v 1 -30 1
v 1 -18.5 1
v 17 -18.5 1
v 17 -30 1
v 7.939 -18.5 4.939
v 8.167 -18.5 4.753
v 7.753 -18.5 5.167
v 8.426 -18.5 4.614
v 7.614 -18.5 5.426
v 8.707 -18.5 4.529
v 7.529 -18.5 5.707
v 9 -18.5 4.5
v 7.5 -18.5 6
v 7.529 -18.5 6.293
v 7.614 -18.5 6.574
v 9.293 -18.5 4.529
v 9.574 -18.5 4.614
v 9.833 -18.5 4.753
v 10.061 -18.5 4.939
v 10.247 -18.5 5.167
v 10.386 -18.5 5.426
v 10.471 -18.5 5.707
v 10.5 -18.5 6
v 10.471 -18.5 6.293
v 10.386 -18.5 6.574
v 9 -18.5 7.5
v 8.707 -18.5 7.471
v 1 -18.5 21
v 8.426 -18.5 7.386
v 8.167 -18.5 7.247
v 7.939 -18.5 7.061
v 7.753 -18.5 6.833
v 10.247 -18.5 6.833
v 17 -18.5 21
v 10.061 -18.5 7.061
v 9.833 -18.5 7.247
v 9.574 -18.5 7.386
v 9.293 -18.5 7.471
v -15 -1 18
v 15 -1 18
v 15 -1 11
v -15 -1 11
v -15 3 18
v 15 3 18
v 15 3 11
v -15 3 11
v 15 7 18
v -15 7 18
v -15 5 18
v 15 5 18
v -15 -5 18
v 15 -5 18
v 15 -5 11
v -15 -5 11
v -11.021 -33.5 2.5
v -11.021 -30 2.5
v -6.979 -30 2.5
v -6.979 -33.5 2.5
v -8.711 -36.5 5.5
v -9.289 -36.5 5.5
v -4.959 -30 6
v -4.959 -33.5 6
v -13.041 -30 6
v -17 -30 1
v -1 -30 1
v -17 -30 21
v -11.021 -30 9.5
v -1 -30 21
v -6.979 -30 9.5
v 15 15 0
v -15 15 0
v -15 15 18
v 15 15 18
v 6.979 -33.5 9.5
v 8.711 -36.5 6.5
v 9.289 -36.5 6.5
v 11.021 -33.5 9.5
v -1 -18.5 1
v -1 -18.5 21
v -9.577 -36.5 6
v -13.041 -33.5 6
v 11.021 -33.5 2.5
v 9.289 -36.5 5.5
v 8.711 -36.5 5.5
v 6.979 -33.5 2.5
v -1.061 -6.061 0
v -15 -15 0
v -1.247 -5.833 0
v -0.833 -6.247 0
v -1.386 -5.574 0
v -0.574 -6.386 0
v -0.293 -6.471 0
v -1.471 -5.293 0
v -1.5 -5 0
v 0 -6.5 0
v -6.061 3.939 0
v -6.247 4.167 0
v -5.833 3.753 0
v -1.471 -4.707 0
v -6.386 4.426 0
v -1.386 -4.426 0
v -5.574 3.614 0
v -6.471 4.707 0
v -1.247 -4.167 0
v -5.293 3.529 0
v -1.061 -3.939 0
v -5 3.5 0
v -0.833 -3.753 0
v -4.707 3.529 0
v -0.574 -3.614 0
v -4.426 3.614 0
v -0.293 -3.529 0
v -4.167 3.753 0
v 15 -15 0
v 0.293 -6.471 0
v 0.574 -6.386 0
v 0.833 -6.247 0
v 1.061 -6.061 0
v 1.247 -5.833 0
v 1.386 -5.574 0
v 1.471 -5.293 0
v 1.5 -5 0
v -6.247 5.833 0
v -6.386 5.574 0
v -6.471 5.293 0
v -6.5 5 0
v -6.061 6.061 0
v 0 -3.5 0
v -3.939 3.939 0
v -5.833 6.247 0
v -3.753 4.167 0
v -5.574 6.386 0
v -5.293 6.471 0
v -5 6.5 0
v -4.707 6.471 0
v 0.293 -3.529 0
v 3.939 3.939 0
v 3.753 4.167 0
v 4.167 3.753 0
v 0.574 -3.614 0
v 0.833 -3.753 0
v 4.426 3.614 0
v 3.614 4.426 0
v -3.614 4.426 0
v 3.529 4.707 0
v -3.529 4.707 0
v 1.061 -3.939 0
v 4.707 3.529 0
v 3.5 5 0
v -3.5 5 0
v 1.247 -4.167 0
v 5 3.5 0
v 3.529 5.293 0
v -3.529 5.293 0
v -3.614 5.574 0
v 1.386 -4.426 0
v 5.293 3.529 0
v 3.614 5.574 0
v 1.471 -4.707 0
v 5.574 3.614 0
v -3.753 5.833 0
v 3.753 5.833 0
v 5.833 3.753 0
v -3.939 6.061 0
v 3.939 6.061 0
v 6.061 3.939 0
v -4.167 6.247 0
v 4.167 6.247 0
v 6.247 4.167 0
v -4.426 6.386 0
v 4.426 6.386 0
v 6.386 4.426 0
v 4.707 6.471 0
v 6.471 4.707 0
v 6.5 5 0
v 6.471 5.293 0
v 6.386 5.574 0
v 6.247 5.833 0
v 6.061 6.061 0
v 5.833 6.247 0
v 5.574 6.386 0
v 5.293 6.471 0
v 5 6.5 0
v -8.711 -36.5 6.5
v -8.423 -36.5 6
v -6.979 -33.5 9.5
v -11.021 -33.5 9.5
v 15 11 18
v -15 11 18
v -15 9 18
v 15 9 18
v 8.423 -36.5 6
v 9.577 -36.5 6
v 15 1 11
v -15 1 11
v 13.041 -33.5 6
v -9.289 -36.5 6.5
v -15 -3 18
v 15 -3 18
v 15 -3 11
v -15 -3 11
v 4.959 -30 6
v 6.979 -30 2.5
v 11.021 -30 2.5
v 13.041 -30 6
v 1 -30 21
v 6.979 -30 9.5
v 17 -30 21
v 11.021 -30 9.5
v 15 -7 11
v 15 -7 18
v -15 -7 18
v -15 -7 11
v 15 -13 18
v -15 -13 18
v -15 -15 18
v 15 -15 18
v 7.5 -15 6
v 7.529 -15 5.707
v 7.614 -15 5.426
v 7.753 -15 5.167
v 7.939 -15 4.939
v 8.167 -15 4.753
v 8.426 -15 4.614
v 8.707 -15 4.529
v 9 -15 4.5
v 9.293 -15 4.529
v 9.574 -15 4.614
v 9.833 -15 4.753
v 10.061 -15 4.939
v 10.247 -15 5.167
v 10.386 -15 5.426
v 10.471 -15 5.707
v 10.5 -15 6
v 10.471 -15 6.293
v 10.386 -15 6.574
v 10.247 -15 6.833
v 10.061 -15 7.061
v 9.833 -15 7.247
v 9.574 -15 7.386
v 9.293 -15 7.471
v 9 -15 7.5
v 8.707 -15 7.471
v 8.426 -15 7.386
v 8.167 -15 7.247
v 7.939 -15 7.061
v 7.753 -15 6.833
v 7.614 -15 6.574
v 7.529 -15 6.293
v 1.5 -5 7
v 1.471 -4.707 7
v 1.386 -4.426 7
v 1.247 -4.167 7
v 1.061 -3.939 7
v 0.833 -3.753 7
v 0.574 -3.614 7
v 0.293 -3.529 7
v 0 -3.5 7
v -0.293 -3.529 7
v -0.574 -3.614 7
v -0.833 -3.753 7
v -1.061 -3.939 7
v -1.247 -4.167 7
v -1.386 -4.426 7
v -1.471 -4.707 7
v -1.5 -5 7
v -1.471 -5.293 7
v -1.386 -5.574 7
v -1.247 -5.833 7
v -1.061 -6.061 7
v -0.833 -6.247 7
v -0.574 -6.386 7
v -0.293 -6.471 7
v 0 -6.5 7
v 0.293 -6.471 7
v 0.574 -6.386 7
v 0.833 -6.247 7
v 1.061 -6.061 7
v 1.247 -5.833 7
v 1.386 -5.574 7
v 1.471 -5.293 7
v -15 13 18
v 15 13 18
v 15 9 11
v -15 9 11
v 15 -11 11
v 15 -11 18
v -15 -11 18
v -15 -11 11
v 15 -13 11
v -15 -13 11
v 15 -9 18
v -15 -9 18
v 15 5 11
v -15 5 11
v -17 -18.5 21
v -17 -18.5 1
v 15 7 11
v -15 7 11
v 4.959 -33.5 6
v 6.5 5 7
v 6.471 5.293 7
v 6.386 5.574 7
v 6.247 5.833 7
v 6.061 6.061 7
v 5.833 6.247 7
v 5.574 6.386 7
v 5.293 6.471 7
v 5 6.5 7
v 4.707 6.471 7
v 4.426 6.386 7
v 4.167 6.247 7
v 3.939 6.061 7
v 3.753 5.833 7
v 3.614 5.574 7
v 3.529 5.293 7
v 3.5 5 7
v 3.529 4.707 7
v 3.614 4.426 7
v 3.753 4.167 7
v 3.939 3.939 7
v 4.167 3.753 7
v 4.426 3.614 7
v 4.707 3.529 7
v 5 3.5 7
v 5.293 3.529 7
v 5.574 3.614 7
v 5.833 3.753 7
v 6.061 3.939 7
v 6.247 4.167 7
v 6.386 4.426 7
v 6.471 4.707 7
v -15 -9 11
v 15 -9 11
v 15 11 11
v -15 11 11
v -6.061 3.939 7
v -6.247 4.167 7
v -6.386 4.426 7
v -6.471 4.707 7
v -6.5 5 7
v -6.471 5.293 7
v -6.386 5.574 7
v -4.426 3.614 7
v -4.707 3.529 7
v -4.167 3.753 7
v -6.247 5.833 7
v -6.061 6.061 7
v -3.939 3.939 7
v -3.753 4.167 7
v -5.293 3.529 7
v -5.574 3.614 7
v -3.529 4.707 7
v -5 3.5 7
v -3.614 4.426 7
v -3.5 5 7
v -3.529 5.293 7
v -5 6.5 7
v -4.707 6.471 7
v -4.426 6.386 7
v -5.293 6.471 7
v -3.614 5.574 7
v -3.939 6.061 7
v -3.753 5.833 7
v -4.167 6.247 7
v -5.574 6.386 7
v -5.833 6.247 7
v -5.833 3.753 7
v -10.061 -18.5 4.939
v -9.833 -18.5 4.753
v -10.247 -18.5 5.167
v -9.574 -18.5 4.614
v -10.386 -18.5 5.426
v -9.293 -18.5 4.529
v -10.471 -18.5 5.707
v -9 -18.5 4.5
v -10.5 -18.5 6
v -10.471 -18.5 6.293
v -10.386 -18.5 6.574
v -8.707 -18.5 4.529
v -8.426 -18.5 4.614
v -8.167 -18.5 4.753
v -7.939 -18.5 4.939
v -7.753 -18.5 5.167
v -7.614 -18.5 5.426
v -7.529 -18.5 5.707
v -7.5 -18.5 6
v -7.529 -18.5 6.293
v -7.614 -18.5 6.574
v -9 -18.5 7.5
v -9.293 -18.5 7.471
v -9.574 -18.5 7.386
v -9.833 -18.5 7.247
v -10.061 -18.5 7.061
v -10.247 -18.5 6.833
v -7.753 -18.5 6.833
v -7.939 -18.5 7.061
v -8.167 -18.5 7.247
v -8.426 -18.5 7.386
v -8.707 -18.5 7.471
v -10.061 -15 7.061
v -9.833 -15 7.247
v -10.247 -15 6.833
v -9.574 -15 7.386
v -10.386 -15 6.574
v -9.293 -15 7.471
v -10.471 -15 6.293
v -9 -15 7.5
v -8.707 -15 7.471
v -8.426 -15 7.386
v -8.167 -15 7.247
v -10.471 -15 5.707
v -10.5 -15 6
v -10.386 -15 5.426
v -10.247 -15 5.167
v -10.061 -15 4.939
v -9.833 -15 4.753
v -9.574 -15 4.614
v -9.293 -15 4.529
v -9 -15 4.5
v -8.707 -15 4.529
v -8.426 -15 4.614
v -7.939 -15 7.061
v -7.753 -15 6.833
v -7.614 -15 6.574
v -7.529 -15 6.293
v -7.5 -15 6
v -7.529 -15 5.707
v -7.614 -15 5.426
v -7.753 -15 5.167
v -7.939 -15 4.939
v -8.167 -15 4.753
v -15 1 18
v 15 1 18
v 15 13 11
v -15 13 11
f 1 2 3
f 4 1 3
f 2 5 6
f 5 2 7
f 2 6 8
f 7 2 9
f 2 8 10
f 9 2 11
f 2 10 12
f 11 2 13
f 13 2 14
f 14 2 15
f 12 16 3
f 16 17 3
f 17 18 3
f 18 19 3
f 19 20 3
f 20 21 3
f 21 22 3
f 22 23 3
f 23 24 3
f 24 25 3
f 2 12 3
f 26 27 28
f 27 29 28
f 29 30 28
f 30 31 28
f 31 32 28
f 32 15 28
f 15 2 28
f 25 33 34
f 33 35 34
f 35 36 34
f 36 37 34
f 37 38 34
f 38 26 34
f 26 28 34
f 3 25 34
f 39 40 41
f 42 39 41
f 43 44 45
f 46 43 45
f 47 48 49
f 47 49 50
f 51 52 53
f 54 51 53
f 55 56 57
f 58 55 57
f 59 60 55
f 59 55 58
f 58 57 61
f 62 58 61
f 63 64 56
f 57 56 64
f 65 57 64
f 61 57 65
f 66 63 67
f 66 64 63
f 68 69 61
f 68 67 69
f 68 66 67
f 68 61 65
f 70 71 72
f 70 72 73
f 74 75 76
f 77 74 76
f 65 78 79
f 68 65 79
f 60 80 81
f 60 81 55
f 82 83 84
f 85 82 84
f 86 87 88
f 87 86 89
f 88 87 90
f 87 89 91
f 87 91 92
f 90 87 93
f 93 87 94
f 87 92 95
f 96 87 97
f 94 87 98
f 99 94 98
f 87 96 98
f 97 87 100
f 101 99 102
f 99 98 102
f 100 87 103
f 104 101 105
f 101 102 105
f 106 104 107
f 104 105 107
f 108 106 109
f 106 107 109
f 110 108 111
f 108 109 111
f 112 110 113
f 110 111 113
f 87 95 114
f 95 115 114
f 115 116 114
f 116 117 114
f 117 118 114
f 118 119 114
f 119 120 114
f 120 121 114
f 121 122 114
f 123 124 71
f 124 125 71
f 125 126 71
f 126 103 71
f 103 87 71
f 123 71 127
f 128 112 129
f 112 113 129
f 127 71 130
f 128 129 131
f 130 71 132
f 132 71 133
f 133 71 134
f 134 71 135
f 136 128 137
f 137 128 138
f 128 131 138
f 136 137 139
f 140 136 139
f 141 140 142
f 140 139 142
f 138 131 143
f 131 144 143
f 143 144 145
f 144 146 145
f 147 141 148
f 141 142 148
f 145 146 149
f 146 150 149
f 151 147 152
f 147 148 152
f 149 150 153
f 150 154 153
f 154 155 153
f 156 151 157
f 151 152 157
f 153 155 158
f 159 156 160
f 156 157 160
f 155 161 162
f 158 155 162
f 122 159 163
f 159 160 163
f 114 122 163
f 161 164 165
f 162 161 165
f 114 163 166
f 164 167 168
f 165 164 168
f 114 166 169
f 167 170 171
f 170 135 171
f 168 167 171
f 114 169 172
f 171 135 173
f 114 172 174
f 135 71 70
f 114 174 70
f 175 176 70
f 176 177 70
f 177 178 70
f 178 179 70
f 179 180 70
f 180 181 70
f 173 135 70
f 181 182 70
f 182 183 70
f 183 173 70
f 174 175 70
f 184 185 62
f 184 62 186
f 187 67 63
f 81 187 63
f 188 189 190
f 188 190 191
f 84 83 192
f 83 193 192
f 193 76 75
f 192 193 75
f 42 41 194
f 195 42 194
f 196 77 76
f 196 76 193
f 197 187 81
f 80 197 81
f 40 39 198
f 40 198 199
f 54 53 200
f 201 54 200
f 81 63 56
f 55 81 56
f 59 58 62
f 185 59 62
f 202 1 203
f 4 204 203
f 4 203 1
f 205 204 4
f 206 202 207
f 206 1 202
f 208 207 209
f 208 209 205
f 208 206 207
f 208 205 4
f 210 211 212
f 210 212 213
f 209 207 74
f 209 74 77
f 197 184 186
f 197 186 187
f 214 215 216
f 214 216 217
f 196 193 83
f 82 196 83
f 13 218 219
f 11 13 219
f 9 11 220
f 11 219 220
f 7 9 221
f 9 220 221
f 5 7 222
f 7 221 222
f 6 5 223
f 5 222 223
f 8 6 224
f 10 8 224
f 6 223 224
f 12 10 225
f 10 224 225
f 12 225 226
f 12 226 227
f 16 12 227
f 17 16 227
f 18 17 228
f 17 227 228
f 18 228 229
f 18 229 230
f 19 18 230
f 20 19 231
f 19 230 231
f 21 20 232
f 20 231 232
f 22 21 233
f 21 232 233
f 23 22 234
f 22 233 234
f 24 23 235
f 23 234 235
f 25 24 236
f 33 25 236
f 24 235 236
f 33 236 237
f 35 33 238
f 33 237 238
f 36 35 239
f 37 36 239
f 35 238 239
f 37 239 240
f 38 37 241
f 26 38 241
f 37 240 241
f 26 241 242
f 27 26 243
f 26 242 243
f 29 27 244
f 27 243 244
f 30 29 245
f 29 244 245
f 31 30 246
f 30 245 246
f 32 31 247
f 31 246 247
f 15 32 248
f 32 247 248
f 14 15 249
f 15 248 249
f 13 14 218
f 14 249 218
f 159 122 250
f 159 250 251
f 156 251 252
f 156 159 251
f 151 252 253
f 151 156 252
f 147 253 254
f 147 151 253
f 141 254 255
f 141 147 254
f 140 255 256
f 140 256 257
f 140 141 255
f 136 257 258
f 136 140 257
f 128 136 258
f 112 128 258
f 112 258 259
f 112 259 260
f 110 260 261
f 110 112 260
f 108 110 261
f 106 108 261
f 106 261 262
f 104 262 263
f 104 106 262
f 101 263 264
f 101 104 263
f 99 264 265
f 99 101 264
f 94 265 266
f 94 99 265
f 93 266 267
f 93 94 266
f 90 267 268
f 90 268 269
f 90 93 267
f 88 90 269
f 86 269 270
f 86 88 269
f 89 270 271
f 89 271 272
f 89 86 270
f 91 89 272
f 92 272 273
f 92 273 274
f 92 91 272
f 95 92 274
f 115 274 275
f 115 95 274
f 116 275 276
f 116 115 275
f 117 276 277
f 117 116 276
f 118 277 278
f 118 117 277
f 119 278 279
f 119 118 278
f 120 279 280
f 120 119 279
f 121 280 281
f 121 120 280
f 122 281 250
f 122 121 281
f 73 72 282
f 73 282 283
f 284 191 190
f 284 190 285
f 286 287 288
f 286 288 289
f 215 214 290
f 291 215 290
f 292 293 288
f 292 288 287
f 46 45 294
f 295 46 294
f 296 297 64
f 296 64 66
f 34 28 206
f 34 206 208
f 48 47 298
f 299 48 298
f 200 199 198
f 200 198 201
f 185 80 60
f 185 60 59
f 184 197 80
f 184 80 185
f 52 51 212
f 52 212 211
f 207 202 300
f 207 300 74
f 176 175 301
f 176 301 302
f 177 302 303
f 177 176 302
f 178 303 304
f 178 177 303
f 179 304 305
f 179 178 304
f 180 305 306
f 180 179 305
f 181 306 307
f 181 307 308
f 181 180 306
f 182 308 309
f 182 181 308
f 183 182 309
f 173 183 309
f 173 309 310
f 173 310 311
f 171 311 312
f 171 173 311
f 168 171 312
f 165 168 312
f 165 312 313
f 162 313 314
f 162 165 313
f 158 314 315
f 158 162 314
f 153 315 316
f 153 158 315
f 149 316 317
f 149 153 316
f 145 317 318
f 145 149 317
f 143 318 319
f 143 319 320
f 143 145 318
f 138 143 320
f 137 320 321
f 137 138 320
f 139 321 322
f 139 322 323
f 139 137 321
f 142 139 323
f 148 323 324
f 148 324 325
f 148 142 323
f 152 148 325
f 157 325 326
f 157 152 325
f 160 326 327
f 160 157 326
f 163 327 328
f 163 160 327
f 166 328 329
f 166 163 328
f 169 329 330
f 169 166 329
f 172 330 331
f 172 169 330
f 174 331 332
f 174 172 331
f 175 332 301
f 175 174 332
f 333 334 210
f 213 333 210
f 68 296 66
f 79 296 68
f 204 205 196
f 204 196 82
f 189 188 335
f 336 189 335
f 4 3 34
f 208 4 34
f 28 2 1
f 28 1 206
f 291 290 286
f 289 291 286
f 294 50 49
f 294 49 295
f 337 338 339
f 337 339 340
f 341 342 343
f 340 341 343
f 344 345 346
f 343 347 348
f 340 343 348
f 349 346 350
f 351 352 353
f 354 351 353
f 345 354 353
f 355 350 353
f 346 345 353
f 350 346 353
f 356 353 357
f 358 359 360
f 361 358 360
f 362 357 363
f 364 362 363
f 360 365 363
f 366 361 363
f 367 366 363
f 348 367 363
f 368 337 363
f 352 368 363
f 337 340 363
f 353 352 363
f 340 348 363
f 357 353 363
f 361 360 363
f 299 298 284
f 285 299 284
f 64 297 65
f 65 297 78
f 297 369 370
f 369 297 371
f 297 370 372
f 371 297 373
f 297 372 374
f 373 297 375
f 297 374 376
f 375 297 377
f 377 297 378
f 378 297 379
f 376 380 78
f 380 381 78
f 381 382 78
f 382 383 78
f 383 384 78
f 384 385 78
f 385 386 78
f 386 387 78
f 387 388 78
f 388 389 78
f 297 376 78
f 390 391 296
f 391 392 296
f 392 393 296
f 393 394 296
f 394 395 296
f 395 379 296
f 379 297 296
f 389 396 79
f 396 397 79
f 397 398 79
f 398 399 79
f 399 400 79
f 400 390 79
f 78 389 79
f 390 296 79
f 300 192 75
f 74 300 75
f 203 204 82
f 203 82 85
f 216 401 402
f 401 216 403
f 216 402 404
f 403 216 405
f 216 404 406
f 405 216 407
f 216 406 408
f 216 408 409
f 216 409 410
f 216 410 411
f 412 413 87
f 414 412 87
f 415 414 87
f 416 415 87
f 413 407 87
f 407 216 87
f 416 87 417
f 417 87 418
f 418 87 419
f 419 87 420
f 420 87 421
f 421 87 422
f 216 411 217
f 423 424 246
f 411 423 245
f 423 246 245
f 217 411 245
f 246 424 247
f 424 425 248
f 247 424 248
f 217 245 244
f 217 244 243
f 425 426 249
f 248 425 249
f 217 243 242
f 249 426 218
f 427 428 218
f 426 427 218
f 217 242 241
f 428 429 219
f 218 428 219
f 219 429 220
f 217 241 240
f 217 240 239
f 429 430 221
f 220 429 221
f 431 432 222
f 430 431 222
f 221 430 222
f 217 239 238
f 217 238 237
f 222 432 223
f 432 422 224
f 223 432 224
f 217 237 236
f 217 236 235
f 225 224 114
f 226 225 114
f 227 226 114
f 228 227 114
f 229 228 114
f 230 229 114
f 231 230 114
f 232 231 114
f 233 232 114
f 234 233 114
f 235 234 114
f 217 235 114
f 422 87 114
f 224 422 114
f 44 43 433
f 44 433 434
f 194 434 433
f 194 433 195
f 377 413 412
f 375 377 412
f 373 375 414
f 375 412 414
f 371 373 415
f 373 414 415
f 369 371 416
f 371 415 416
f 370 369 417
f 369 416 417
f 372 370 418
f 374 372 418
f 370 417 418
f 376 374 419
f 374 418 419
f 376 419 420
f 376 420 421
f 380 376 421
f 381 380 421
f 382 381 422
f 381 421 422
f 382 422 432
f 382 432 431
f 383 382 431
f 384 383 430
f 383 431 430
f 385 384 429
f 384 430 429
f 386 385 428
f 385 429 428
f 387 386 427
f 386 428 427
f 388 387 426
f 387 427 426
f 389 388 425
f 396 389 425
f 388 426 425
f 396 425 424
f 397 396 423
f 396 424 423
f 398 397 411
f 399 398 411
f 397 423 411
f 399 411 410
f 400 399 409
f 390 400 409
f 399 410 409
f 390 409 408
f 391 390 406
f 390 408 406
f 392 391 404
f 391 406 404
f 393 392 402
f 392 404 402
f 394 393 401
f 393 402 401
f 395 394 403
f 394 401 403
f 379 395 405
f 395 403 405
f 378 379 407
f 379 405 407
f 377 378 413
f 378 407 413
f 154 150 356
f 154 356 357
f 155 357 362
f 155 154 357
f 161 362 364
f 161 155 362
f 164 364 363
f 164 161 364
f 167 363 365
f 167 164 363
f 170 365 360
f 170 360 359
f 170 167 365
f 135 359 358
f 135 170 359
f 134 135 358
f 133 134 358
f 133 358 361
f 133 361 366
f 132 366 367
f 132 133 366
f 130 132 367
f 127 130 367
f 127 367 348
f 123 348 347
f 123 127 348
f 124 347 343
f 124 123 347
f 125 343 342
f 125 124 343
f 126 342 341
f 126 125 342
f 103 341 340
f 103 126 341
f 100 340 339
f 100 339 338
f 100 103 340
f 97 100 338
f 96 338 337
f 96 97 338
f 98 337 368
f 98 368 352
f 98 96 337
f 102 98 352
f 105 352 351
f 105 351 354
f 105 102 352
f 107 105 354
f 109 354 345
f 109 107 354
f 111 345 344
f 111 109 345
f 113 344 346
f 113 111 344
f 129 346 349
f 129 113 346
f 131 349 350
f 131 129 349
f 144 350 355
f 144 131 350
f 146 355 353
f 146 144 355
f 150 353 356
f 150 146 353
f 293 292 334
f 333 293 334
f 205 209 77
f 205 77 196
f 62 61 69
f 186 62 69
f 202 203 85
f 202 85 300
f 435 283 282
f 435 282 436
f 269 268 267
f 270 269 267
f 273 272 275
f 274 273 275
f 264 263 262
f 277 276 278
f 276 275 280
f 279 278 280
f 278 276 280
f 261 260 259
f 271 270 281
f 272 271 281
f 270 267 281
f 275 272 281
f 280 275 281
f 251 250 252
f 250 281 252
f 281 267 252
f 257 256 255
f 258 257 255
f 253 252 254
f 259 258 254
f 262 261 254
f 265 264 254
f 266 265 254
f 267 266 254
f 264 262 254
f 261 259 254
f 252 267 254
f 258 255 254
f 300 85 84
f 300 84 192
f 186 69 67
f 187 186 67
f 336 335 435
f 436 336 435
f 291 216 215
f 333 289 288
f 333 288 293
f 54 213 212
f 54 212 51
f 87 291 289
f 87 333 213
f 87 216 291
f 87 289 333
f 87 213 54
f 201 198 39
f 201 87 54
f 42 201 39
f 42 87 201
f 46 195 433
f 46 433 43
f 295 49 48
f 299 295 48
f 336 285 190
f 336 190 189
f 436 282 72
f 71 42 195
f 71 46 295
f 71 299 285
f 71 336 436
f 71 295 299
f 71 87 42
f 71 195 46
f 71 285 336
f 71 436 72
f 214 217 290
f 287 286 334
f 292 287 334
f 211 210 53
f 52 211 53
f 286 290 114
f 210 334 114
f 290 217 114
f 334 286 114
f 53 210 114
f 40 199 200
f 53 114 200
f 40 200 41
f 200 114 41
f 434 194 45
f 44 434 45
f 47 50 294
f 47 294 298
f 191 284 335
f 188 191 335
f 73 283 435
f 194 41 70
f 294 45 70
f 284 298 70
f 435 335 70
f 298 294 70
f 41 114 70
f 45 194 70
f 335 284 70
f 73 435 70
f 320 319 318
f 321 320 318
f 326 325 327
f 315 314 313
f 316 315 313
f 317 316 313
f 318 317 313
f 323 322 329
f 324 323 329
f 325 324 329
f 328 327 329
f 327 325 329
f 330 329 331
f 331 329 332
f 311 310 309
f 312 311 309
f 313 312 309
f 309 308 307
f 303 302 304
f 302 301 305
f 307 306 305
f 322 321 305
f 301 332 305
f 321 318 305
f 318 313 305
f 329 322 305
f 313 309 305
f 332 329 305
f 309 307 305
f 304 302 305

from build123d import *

# Parameters (mm, degrees)
SKICA1_W                 = 30
SKICA1_H                 = 30
SKICA1_R                 = 1.5
P_IDAT_VYSUNUT_M1_DEPTH  = 7
SKICA2_W                 = 30
SKICA2_H                 = 30
P_IDAT_VYSUNUT_M2_DEPTH  = 11
SKICA3_W                 = 7
SKICA3_H                 = 2
ODEBRAT_VYSUNUT_M1_DEPTH = 30
SKICA4_R                 = 1.5
P_IDAT_VYSUNUT_M3_DEPTH  = 3.5
SKICA5_W                 = 16
SKICA5_H                 = 20
P_IDAT_VYSUNUT_M4_DEPTH  = 11.5
P_IDAT_VYSUNUT_M5_DEPTH  = 6.5
ZKOSEN_1_SIZE            = 3


with BuildPart() as part:
    # Skica1 → Přidat vysunutím1 (new body)
    with BuildSketch(Plane.XY):
        Rectangle(SKICA1_W, SKICA1_H)
        with Locations((5, 5)):
            Circle(SKICA1_R, mode=Mode.SUBTRACT)
        with Locations((-5, 5)):
            Circle(SKICA1_R, mode=Mode.SUBTRACT)
        with Locations((0, -5)):
            Circle(SKICA1_R, mode=Mode.SUBTRACT)
    extrude(amount=P_IDAT_VYSUNUT_M1_DEPTH)

    # Skica2 → Přidat vysunutím2 (add)
    with BuildSketch(Plane.XY.offset(7)):
        Rectangle(SKICA2_W, SKICA2_H)
    extrude(amount=P_IDAT_VYSUNUT_M2_DEPTH)

    # Skica3 → Odebrat vysunutím1 (cut)
    with BuildSketch(Plane(origin=(15, 0, 0), x_dir=(0, 0, -1), z_dir=(1, 0, 0))):
        with Locations((-14.5, 12)):
            Rectangle(SKICA3_W, SKICA3_H)
        with Locations((-14.5, 8)):
            Rectangle(SKICA3_W, SKICA3_H)
        with Locations((-14.5, 4)):
            Rectangle(SKICA3_W, SKICA3_H)
        with Locations((-14.5, 0)):
            Rectangle(SKICA3_W, SKICA3_H)
        with Locations((-14.5, -4)):
            Rectangle(SKICA3_W, SKICA3_H)
        with Locations((-14.5, -8)):
            Rectangle(SKICA3_W, SKICA3_H)
        with Locations((-14.5, -12)):
            Rectangle(SKICA3_W, SKICA3_H)
    extrude(amount=-ODEBRAT_VYSUNUT_M1_DEPTH, mode=Mode.SUBTRACT)

    # Skica4 → Přidat vysunutím3 (add)
    with BuildSketch(Plane.XZ.offset(15)):
        with Locations(Location((9, 6, 0), (0, 0, 180))):
            Circle(SKICA4_R)
        with Locations(Location((-9, 6, 0), (0, 0, 180))):
            Circle(SKICA4_R)
    extrude(amount=P_IDAT_VYSUNUT_M3_DEPTH)

    # Skica5 → Přidat vysunutím4 (add)
    with BuildSketch(Plane.XZ.offset(18.5)):
        with Locations((9, 11)):
            Rectangle(SKICA5_W, SKICA5_H)
        with Locations((-9, 11)):
            Rectangle(SKICA5_W, SKICA5_H)
    extrude(amount=P_IDAT_VYSUNUT_M4_DEPTH)

    # Skica6 → Přidat vysunutím5 (add)
    with BuildSketch(Plane.XZ.offset(30)):
        Polygon((-4.958548116, 6), (-6.979274058, 9.5), (-11.020725942, 9.5), (-13.041451884, 6), (-11.020725942, 2.5), (-6.979274058, 2.5), align=None)
        Polygon((6.979274058, 2.5), (4.958548116, 6), (6.979274058, 9.5), (11.020725942, 9.5), (13.041451884, 6), (11.020725942, 2.5), align=None)
    extrude(amount=P_IDAT_VYSUNUT_M5_DEPTH)

    # Zkosení1
    zkosen_1_edges = [part.edges().sort_by_distance(p)[0] for p in [
        (-5.968911087, -36.5, 4.25),
        (-5.968911087, -36.5, 7.75),
        (-9, -36.5, 9.5),
        (-12.031088913, -36.5, 7.75),
        (-12.031088913, -36.5, 4.25),
        (-9, -36.5, 2.5),
        (9, -36.5, 2.5),
        (12.031088913, -36.5, 4.25),
        (12.031088913, -36.5, 7.75),
        (9, -36.5, 9.5),
        (5.968911087, -36.5, 7.75),
        (5.968911087, -36.5, 4.25),
    ]]
    chamfer(zkosen_1_edges, length=ZKOSEN_1_SIZE)


solid = part.part
